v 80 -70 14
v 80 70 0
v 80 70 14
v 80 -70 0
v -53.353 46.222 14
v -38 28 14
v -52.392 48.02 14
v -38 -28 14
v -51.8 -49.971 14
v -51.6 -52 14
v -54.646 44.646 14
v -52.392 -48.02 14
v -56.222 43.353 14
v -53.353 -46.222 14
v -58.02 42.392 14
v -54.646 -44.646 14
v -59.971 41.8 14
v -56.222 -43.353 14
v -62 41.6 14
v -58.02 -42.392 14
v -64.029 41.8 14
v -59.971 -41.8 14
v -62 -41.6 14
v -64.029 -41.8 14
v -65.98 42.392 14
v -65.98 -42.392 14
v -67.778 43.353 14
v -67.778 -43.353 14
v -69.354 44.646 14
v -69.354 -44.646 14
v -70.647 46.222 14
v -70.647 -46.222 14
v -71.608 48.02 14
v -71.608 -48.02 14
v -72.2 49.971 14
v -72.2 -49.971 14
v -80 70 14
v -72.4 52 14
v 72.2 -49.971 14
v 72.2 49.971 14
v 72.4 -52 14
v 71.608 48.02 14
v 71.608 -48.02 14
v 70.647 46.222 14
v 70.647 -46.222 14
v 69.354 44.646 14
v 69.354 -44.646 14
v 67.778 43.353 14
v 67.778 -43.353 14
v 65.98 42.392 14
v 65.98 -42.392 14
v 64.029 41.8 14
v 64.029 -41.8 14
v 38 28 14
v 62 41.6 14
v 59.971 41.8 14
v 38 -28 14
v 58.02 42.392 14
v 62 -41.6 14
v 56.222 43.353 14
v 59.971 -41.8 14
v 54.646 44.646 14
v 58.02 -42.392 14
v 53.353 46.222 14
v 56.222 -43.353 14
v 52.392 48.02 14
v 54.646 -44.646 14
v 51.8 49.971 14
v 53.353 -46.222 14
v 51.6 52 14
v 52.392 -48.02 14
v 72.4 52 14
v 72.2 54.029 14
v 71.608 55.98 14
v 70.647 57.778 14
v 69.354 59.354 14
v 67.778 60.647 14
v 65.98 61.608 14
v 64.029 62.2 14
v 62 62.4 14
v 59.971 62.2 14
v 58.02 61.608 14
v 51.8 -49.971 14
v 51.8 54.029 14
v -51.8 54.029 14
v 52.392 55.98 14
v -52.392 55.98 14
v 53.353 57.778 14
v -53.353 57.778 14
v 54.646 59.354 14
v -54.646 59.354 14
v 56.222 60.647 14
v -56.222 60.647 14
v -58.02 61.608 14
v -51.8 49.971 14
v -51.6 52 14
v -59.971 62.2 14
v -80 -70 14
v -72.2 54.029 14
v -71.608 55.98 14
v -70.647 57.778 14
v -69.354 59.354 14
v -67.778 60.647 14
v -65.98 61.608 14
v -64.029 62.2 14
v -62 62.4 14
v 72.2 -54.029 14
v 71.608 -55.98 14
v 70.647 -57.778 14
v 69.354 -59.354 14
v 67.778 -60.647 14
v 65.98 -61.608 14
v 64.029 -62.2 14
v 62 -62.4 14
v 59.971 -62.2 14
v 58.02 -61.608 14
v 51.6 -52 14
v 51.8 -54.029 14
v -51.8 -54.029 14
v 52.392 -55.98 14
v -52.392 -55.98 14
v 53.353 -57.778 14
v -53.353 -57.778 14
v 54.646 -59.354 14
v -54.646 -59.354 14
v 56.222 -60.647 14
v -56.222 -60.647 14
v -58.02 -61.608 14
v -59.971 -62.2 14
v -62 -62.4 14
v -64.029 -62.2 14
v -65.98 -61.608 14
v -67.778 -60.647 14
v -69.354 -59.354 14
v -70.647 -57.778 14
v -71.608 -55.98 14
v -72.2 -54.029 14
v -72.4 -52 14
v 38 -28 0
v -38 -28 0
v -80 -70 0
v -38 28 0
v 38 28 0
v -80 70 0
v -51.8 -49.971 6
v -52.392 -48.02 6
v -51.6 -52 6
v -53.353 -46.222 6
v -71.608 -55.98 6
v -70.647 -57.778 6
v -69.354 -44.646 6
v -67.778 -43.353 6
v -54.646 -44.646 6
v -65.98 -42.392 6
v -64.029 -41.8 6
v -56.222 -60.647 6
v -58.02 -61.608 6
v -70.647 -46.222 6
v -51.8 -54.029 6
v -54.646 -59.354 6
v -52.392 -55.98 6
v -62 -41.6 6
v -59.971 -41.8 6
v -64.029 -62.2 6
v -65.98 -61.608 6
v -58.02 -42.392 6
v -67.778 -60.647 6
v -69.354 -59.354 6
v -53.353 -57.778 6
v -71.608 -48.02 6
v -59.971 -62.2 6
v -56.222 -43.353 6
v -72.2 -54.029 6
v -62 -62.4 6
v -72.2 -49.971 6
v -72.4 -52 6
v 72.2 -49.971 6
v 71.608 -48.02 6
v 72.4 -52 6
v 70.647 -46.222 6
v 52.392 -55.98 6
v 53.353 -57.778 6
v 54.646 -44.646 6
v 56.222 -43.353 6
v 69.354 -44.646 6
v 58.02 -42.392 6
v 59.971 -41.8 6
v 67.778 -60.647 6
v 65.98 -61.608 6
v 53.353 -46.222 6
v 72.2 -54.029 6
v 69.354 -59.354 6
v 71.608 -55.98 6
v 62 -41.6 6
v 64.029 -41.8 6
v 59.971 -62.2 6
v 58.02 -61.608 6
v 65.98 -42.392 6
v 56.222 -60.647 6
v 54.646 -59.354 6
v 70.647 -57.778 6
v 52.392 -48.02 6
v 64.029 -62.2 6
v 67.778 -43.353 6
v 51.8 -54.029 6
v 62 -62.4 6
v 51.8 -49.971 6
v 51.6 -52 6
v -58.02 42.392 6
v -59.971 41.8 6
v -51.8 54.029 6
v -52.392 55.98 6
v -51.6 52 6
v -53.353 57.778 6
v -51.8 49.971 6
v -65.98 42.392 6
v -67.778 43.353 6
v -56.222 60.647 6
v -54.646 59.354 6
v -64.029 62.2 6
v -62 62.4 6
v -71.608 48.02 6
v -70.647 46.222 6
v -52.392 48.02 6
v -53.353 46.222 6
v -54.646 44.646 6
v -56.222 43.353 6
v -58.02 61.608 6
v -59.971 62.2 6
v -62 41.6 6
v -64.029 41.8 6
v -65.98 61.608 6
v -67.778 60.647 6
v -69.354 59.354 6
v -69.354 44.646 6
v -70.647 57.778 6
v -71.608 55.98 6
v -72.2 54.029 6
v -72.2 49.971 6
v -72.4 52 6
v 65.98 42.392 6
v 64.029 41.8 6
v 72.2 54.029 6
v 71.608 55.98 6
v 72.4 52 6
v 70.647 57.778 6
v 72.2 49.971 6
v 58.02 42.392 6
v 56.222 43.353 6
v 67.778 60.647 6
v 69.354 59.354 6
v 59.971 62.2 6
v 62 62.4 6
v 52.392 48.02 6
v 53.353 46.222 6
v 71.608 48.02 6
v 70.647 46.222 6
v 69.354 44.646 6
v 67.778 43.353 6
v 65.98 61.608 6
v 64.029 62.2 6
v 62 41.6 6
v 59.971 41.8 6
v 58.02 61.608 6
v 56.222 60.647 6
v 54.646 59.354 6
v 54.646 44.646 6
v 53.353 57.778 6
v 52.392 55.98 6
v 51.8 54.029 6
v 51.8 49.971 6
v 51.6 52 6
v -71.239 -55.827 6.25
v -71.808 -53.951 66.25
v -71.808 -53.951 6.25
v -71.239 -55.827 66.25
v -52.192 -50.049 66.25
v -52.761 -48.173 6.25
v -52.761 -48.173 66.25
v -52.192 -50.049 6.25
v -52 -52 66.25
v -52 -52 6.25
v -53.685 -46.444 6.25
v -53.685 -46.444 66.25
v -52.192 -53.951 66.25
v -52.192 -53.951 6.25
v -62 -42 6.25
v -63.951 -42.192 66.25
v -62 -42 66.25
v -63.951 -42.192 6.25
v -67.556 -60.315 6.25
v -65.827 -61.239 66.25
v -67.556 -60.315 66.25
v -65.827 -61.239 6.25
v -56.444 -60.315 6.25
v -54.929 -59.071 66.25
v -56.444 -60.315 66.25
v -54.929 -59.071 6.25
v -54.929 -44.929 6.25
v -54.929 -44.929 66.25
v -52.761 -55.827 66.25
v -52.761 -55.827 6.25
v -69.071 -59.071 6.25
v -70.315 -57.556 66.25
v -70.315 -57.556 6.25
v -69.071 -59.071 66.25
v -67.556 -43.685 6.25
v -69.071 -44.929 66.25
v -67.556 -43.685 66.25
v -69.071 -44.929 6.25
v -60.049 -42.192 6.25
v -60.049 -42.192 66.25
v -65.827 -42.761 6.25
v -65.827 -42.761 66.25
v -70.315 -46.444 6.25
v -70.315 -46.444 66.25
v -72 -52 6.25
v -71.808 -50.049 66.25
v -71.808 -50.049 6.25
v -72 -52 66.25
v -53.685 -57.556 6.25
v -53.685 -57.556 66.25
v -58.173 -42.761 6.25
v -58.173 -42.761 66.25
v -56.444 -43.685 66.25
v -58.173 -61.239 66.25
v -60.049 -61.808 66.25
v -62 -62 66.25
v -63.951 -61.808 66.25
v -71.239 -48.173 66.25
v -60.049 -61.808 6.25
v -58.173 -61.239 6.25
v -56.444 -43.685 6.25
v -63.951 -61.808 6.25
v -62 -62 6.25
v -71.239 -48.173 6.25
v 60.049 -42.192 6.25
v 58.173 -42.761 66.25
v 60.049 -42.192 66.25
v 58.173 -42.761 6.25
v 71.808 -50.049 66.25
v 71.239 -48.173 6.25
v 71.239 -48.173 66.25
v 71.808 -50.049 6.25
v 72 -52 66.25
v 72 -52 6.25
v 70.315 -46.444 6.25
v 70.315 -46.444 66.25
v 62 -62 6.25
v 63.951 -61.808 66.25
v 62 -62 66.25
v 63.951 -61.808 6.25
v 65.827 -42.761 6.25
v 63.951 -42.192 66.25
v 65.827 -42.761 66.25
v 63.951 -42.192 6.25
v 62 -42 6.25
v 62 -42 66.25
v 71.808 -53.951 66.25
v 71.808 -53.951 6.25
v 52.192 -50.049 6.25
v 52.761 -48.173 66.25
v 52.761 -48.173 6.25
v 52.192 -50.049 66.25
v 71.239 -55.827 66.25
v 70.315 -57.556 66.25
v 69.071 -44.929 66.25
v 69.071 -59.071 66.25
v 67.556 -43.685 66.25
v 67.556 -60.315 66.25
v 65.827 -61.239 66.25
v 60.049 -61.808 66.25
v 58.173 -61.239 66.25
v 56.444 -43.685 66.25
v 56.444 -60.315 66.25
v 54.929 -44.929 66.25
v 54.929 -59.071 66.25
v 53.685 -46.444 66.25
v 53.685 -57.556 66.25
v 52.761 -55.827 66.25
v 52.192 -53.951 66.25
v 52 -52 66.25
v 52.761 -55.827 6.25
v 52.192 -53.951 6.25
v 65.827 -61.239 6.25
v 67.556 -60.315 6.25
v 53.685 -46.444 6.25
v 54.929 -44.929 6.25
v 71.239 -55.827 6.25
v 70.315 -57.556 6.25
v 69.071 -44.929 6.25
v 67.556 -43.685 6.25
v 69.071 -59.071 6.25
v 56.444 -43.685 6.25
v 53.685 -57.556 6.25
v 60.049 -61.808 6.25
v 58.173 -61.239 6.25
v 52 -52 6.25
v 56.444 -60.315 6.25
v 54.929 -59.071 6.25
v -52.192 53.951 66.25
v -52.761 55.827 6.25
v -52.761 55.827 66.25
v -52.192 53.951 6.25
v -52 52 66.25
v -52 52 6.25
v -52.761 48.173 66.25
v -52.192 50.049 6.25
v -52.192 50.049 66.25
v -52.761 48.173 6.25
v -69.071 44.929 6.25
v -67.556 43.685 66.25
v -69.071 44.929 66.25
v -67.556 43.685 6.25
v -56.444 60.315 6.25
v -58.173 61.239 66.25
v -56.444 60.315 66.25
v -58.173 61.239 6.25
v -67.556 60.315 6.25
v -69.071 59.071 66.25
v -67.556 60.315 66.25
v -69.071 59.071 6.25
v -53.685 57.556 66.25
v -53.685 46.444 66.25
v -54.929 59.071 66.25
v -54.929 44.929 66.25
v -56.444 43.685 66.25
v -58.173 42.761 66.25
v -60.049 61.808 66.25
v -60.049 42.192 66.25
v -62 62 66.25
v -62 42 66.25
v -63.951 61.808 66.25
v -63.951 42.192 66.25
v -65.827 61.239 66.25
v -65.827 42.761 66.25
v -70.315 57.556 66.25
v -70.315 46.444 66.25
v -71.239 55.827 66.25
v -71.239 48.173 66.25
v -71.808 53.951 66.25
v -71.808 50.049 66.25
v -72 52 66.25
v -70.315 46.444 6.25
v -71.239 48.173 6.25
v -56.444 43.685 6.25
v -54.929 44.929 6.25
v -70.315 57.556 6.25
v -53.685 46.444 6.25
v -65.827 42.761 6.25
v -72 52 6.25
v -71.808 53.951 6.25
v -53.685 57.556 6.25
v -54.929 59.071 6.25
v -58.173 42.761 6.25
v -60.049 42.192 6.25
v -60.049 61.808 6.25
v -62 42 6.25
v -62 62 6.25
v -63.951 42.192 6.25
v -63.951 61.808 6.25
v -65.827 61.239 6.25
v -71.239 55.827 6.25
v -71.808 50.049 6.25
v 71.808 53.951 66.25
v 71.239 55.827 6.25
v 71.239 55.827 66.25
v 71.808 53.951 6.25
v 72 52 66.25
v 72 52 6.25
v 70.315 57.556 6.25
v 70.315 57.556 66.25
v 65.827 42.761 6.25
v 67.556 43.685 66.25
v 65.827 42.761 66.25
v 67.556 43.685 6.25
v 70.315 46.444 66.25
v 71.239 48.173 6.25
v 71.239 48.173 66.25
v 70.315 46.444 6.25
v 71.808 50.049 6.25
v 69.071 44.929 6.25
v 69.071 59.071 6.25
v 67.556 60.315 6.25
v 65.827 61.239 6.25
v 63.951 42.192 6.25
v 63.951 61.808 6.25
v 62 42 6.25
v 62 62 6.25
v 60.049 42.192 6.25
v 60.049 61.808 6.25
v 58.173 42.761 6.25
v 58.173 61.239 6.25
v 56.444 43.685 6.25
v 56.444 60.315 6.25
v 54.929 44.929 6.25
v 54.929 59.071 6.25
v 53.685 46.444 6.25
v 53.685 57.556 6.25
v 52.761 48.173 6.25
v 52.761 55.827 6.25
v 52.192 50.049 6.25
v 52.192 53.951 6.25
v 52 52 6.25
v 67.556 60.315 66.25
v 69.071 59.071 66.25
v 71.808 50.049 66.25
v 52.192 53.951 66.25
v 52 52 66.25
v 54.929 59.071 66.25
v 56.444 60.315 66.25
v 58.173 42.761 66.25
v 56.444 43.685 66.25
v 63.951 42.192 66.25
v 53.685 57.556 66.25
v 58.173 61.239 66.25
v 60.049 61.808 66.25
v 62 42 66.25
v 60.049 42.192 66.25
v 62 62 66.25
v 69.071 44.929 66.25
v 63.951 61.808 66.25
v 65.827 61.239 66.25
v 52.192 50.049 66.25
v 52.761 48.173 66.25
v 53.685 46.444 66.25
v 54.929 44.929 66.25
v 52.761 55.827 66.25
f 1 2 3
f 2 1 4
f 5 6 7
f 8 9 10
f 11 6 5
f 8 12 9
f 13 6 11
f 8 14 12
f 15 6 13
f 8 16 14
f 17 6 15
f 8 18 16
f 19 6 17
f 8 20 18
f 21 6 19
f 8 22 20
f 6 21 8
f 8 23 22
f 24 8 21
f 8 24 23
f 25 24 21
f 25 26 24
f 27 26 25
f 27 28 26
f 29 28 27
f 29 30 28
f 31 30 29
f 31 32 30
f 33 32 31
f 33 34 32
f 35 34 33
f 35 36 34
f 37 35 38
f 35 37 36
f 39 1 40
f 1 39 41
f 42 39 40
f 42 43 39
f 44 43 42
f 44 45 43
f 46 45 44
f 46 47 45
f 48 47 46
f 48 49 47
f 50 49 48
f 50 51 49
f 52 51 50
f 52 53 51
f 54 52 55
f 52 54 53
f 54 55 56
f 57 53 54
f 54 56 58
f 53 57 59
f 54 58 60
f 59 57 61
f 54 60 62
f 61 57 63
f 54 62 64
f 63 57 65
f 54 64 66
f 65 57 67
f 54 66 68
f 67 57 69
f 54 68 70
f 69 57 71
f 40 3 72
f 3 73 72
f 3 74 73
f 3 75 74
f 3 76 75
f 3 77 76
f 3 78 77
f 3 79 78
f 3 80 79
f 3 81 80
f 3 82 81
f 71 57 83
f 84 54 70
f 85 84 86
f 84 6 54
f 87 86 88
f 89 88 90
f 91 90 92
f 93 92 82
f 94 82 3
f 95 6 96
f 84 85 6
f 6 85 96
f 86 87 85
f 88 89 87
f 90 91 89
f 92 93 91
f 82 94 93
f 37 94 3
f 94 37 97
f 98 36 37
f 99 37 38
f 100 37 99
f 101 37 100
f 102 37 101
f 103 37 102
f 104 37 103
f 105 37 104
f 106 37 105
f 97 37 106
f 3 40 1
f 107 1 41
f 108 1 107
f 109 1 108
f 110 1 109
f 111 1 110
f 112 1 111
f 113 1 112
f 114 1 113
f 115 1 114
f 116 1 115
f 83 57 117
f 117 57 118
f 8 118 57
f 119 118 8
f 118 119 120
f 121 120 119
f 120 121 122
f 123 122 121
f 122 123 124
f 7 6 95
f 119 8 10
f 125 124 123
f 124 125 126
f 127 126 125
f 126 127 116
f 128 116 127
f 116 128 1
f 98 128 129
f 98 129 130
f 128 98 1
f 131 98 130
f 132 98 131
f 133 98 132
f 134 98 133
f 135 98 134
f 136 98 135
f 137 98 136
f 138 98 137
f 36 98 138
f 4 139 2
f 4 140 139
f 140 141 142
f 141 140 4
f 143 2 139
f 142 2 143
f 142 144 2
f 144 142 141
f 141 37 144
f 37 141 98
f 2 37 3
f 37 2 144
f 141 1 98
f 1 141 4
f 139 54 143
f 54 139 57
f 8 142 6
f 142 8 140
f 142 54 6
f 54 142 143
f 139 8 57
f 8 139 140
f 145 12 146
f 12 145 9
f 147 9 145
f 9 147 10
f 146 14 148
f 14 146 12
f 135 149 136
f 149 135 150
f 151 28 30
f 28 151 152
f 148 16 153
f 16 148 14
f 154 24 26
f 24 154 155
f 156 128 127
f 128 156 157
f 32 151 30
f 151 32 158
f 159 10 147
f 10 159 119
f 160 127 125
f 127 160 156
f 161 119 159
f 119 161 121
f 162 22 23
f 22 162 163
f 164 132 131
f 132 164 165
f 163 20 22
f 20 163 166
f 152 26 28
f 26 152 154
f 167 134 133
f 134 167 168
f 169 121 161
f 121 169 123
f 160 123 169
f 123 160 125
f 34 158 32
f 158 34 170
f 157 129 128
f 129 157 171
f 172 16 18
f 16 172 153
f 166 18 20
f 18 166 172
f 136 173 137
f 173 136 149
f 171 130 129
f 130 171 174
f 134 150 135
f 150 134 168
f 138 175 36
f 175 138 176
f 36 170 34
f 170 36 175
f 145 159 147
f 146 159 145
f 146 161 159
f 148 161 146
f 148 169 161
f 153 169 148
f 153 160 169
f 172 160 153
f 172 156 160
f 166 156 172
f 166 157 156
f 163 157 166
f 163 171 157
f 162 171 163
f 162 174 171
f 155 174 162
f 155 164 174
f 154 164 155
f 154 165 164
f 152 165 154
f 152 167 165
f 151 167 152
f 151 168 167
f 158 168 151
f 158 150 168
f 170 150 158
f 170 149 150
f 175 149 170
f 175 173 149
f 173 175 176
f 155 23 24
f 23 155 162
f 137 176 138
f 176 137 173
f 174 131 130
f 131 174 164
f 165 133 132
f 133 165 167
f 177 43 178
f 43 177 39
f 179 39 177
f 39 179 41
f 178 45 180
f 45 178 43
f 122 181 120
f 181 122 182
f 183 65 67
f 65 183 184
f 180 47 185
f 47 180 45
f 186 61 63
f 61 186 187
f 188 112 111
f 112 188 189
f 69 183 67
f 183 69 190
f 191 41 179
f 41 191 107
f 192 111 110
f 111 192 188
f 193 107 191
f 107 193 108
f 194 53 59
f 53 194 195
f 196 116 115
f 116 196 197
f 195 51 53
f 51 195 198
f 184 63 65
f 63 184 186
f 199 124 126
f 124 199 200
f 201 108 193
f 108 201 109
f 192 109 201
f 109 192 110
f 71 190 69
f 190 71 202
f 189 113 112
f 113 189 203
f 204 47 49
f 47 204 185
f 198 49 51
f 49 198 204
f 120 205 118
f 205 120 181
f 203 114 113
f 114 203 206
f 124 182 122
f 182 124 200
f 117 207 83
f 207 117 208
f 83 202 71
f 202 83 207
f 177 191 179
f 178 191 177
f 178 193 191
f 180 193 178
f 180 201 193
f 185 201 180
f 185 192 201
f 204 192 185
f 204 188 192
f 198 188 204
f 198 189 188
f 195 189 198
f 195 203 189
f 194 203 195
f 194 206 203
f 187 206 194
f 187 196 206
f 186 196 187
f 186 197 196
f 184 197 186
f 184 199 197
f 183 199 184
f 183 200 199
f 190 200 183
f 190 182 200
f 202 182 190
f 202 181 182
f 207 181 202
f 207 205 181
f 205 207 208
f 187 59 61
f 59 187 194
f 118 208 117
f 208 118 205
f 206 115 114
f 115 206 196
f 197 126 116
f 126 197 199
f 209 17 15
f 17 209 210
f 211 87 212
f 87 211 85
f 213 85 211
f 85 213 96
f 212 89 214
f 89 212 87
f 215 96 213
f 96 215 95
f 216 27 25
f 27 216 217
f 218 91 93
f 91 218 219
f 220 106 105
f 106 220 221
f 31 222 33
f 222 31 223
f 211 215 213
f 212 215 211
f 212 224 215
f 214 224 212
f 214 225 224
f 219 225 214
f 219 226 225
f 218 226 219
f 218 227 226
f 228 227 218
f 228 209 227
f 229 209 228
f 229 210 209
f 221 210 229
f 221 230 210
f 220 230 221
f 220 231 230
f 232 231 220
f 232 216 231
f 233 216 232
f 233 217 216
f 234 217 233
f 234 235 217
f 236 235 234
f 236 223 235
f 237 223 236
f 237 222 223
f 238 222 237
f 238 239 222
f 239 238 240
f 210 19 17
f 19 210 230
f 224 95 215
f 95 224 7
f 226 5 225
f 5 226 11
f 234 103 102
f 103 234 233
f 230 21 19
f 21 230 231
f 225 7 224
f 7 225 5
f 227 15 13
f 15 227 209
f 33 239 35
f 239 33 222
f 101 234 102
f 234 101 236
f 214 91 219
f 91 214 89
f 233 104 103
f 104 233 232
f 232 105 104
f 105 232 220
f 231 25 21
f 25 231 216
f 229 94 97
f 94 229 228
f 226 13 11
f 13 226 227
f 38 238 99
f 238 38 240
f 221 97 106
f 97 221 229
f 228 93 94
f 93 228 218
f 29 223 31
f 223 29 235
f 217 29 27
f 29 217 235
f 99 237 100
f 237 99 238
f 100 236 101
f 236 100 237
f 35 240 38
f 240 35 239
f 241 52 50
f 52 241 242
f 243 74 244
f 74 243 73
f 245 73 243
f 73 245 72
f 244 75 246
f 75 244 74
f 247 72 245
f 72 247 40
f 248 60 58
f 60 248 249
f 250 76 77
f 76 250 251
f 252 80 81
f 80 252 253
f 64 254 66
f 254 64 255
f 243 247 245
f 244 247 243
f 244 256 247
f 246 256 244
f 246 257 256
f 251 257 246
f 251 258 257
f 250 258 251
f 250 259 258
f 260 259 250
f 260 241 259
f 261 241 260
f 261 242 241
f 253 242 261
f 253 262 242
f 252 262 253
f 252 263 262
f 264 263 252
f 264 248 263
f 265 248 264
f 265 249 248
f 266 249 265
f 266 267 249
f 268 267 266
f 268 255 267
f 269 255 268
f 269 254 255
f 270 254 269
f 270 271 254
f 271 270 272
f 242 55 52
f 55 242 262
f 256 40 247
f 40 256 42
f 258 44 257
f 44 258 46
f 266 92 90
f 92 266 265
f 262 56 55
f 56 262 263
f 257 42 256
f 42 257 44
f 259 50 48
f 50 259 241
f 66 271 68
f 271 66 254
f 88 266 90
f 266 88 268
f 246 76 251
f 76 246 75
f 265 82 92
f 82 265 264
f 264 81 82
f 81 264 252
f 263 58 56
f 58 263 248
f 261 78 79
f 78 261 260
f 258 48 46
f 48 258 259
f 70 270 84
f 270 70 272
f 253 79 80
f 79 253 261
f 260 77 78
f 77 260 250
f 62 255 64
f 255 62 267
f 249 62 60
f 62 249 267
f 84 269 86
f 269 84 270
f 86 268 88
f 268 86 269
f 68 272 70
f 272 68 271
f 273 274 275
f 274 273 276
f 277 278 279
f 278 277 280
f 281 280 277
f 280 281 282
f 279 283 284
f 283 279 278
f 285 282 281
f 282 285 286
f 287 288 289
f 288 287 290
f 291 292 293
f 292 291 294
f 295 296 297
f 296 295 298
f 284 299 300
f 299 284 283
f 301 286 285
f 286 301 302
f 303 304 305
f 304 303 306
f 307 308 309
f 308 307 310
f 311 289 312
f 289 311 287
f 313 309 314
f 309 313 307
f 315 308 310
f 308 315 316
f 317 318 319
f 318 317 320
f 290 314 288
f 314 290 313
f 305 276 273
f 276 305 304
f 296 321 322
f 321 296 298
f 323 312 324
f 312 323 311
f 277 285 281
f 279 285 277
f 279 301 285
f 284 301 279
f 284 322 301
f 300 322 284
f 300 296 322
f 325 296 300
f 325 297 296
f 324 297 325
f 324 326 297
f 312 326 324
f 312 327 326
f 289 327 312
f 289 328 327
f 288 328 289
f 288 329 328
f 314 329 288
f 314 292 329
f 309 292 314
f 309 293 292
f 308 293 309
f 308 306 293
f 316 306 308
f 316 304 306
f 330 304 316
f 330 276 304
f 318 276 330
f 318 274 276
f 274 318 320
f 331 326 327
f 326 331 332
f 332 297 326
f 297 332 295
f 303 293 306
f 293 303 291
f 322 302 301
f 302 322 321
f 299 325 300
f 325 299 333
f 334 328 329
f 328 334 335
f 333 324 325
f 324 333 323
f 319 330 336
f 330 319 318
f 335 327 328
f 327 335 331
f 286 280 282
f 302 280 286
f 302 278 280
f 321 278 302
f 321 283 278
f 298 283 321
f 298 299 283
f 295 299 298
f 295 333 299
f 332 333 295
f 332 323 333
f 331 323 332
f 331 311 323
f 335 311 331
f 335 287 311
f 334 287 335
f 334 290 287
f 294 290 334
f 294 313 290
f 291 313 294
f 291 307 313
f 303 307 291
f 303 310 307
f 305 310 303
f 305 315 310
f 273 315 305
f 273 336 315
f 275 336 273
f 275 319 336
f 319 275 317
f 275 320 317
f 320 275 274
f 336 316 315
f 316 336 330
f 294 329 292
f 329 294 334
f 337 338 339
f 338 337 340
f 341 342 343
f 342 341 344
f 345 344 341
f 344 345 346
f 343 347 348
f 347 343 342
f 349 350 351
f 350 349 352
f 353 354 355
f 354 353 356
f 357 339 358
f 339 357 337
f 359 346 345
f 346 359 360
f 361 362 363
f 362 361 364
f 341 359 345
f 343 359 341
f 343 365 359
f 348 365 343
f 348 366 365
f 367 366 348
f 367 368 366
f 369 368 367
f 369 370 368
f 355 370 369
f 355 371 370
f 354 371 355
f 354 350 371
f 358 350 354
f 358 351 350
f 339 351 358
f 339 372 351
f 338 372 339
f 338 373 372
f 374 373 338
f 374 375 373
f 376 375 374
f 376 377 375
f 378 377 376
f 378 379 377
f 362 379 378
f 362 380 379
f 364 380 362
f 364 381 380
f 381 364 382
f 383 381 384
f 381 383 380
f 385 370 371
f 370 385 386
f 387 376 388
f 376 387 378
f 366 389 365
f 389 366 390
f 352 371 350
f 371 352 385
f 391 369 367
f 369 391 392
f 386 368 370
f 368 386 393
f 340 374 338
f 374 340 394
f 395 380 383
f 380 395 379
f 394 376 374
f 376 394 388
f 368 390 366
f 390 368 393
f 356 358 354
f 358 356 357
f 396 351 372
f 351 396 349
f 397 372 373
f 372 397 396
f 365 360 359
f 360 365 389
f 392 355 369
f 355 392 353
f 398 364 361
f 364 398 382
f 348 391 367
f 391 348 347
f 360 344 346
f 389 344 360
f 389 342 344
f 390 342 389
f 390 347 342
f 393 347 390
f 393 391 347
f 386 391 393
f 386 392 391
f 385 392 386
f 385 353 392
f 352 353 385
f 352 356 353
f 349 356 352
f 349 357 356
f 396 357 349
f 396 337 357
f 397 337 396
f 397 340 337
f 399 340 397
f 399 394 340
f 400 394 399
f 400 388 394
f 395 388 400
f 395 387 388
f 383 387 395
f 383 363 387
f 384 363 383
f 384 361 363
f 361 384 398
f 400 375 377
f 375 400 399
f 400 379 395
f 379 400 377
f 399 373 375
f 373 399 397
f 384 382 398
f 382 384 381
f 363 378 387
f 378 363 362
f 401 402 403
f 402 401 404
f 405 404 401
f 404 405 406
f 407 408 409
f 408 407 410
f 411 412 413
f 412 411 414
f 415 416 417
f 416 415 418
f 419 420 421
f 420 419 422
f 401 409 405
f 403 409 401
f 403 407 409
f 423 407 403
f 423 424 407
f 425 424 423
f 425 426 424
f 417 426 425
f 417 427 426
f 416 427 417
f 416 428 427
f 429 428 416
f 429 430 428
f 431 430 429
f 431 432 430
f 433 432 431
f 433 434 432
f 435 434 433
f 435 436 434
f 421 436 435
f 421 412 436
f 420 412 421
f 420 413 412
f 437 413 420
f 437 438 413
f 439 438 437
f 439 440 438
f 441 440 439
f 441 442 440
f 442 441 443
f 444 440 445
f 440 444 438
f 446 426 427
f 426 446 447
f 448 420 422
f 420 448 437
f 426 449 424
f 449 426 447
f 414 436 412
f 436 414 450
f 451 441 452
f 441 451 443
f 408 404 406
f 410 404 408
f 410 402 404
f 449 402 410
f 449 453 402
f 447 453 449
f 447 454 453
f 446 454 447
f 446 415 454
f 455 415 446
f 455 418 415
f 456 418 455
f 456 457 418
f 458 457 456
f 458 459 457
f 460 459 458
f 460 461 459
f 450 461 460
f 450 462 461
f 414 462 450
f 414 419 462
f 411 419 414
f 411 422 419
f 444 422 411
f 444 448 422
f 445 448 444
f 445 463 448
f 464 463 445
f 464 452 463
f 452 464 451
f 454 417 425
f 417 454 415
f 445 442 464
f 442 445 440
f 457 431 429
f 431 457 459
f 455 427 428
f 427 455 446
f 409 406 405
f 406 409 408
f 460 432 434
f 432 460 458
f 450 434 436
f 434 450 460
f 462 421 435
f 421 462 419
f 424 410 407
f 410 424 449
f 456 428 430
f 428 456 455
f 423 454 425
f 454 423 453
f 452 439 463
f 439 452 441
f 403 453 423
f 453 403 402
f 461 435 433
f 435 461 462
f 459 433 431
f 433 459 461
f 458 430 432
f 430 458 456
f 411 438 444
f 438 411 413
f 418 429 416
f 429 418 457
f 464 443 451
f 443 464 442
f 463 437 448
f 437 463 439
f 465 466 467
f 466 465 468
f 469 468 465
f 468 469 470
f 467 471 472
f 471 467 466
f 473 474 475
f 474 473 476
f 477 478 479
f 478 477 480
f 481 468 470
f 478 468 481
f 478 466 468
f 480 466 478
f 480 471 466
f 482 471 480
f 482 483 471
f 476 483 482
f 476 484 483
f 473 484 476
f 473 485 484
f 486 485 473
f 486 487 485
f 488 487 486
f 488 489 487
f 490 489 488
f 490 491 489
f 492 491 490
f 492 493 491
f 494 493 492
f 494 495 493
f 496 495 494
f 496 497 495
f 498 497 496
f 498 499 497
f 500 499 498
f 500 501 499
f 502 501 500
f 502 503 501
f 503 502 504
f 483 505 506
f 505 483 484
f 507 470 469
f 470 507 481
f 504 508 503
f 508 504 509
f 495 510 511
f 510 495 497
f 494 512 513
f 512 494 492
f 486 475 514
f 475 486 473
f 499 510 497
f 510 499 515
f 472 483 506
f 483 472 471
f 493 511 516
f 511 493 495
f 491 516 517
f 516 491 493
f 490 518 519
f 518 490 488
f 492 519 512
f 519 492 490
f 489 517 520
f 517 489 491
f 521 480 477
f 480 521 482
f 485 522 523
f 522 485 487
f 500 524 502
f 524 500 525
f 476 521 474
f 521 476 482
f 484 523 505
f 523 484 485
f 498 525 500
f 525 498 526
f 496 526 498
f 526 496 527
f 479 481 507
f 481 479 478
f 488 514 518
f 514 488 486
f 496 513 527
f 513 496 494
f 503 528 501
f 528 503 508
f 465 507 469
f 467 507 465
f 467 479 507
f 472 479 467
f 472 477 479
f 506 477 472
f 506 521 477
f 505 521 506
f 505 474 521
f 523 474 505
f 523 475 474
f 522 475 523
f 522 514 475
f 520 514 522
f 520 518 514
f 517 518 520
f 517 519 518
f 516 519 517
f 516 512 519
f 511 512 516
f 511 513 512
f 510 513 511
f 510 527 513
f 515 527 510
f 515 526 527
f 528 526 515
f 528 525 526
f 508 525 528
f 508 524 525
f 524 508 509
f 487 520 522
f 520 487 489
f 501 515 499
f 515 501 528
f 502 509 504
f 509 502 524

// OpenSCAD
$fn = 32;

// ------------------------------------------------------------------------
// Frame with four posts: 160 x 140 mm frame, four d20 posts
// Every part is its own module, assembly() places them once.
// ------------------------------------------------------------------------

// --- part 1 ---
module base_frame() {
  difference() {
    translate([-80, -70, 0]) cube([160, 140, 14]);
    translate([-38, -28, -1]) cube([76, 56, 16]);
    translate([-62, -52, 6]) cylinder(h = 9, d = 20.8);
    translate([62, -52, 6]) cylinder(h = 9, d = 20.8);
    translate([-62, 52, 6]) cylinder(h = 9, d = 20.8);
    translate([62, 52, 6]) cylinder(h = 9, d = 20.8);
  }
}

// --- part 2 ---
module post1() {
  cylinder(h = 60, d = 20);
}

// --- part 3 ---
module post2() {
  cylinder(h = 60, d = 20);
}

// --- part 4 ---
module post3() {
  cylinder(h = 60, d = 20);
}

// --- part 5 ---
module post4() {
  cylinder(h = 60, d = 20);
}

// --- assembly ---
module assembly() {
  translate([0, 0, 0]) rotate([0, 0, 0]) base_frame();
  translate([-62, -52, 6.25]) rotate([0, 0, 0]) post1();
  translate([62, -52, 6.25]) rotate([0, 0, 0]) post2();
  translate([-62, 52, 6.25]) rotate([0, 0, 0]) post3();
  translate([62, 52, 6.25]) rotate([0, 0, 0]) post4();
}

assembly();
